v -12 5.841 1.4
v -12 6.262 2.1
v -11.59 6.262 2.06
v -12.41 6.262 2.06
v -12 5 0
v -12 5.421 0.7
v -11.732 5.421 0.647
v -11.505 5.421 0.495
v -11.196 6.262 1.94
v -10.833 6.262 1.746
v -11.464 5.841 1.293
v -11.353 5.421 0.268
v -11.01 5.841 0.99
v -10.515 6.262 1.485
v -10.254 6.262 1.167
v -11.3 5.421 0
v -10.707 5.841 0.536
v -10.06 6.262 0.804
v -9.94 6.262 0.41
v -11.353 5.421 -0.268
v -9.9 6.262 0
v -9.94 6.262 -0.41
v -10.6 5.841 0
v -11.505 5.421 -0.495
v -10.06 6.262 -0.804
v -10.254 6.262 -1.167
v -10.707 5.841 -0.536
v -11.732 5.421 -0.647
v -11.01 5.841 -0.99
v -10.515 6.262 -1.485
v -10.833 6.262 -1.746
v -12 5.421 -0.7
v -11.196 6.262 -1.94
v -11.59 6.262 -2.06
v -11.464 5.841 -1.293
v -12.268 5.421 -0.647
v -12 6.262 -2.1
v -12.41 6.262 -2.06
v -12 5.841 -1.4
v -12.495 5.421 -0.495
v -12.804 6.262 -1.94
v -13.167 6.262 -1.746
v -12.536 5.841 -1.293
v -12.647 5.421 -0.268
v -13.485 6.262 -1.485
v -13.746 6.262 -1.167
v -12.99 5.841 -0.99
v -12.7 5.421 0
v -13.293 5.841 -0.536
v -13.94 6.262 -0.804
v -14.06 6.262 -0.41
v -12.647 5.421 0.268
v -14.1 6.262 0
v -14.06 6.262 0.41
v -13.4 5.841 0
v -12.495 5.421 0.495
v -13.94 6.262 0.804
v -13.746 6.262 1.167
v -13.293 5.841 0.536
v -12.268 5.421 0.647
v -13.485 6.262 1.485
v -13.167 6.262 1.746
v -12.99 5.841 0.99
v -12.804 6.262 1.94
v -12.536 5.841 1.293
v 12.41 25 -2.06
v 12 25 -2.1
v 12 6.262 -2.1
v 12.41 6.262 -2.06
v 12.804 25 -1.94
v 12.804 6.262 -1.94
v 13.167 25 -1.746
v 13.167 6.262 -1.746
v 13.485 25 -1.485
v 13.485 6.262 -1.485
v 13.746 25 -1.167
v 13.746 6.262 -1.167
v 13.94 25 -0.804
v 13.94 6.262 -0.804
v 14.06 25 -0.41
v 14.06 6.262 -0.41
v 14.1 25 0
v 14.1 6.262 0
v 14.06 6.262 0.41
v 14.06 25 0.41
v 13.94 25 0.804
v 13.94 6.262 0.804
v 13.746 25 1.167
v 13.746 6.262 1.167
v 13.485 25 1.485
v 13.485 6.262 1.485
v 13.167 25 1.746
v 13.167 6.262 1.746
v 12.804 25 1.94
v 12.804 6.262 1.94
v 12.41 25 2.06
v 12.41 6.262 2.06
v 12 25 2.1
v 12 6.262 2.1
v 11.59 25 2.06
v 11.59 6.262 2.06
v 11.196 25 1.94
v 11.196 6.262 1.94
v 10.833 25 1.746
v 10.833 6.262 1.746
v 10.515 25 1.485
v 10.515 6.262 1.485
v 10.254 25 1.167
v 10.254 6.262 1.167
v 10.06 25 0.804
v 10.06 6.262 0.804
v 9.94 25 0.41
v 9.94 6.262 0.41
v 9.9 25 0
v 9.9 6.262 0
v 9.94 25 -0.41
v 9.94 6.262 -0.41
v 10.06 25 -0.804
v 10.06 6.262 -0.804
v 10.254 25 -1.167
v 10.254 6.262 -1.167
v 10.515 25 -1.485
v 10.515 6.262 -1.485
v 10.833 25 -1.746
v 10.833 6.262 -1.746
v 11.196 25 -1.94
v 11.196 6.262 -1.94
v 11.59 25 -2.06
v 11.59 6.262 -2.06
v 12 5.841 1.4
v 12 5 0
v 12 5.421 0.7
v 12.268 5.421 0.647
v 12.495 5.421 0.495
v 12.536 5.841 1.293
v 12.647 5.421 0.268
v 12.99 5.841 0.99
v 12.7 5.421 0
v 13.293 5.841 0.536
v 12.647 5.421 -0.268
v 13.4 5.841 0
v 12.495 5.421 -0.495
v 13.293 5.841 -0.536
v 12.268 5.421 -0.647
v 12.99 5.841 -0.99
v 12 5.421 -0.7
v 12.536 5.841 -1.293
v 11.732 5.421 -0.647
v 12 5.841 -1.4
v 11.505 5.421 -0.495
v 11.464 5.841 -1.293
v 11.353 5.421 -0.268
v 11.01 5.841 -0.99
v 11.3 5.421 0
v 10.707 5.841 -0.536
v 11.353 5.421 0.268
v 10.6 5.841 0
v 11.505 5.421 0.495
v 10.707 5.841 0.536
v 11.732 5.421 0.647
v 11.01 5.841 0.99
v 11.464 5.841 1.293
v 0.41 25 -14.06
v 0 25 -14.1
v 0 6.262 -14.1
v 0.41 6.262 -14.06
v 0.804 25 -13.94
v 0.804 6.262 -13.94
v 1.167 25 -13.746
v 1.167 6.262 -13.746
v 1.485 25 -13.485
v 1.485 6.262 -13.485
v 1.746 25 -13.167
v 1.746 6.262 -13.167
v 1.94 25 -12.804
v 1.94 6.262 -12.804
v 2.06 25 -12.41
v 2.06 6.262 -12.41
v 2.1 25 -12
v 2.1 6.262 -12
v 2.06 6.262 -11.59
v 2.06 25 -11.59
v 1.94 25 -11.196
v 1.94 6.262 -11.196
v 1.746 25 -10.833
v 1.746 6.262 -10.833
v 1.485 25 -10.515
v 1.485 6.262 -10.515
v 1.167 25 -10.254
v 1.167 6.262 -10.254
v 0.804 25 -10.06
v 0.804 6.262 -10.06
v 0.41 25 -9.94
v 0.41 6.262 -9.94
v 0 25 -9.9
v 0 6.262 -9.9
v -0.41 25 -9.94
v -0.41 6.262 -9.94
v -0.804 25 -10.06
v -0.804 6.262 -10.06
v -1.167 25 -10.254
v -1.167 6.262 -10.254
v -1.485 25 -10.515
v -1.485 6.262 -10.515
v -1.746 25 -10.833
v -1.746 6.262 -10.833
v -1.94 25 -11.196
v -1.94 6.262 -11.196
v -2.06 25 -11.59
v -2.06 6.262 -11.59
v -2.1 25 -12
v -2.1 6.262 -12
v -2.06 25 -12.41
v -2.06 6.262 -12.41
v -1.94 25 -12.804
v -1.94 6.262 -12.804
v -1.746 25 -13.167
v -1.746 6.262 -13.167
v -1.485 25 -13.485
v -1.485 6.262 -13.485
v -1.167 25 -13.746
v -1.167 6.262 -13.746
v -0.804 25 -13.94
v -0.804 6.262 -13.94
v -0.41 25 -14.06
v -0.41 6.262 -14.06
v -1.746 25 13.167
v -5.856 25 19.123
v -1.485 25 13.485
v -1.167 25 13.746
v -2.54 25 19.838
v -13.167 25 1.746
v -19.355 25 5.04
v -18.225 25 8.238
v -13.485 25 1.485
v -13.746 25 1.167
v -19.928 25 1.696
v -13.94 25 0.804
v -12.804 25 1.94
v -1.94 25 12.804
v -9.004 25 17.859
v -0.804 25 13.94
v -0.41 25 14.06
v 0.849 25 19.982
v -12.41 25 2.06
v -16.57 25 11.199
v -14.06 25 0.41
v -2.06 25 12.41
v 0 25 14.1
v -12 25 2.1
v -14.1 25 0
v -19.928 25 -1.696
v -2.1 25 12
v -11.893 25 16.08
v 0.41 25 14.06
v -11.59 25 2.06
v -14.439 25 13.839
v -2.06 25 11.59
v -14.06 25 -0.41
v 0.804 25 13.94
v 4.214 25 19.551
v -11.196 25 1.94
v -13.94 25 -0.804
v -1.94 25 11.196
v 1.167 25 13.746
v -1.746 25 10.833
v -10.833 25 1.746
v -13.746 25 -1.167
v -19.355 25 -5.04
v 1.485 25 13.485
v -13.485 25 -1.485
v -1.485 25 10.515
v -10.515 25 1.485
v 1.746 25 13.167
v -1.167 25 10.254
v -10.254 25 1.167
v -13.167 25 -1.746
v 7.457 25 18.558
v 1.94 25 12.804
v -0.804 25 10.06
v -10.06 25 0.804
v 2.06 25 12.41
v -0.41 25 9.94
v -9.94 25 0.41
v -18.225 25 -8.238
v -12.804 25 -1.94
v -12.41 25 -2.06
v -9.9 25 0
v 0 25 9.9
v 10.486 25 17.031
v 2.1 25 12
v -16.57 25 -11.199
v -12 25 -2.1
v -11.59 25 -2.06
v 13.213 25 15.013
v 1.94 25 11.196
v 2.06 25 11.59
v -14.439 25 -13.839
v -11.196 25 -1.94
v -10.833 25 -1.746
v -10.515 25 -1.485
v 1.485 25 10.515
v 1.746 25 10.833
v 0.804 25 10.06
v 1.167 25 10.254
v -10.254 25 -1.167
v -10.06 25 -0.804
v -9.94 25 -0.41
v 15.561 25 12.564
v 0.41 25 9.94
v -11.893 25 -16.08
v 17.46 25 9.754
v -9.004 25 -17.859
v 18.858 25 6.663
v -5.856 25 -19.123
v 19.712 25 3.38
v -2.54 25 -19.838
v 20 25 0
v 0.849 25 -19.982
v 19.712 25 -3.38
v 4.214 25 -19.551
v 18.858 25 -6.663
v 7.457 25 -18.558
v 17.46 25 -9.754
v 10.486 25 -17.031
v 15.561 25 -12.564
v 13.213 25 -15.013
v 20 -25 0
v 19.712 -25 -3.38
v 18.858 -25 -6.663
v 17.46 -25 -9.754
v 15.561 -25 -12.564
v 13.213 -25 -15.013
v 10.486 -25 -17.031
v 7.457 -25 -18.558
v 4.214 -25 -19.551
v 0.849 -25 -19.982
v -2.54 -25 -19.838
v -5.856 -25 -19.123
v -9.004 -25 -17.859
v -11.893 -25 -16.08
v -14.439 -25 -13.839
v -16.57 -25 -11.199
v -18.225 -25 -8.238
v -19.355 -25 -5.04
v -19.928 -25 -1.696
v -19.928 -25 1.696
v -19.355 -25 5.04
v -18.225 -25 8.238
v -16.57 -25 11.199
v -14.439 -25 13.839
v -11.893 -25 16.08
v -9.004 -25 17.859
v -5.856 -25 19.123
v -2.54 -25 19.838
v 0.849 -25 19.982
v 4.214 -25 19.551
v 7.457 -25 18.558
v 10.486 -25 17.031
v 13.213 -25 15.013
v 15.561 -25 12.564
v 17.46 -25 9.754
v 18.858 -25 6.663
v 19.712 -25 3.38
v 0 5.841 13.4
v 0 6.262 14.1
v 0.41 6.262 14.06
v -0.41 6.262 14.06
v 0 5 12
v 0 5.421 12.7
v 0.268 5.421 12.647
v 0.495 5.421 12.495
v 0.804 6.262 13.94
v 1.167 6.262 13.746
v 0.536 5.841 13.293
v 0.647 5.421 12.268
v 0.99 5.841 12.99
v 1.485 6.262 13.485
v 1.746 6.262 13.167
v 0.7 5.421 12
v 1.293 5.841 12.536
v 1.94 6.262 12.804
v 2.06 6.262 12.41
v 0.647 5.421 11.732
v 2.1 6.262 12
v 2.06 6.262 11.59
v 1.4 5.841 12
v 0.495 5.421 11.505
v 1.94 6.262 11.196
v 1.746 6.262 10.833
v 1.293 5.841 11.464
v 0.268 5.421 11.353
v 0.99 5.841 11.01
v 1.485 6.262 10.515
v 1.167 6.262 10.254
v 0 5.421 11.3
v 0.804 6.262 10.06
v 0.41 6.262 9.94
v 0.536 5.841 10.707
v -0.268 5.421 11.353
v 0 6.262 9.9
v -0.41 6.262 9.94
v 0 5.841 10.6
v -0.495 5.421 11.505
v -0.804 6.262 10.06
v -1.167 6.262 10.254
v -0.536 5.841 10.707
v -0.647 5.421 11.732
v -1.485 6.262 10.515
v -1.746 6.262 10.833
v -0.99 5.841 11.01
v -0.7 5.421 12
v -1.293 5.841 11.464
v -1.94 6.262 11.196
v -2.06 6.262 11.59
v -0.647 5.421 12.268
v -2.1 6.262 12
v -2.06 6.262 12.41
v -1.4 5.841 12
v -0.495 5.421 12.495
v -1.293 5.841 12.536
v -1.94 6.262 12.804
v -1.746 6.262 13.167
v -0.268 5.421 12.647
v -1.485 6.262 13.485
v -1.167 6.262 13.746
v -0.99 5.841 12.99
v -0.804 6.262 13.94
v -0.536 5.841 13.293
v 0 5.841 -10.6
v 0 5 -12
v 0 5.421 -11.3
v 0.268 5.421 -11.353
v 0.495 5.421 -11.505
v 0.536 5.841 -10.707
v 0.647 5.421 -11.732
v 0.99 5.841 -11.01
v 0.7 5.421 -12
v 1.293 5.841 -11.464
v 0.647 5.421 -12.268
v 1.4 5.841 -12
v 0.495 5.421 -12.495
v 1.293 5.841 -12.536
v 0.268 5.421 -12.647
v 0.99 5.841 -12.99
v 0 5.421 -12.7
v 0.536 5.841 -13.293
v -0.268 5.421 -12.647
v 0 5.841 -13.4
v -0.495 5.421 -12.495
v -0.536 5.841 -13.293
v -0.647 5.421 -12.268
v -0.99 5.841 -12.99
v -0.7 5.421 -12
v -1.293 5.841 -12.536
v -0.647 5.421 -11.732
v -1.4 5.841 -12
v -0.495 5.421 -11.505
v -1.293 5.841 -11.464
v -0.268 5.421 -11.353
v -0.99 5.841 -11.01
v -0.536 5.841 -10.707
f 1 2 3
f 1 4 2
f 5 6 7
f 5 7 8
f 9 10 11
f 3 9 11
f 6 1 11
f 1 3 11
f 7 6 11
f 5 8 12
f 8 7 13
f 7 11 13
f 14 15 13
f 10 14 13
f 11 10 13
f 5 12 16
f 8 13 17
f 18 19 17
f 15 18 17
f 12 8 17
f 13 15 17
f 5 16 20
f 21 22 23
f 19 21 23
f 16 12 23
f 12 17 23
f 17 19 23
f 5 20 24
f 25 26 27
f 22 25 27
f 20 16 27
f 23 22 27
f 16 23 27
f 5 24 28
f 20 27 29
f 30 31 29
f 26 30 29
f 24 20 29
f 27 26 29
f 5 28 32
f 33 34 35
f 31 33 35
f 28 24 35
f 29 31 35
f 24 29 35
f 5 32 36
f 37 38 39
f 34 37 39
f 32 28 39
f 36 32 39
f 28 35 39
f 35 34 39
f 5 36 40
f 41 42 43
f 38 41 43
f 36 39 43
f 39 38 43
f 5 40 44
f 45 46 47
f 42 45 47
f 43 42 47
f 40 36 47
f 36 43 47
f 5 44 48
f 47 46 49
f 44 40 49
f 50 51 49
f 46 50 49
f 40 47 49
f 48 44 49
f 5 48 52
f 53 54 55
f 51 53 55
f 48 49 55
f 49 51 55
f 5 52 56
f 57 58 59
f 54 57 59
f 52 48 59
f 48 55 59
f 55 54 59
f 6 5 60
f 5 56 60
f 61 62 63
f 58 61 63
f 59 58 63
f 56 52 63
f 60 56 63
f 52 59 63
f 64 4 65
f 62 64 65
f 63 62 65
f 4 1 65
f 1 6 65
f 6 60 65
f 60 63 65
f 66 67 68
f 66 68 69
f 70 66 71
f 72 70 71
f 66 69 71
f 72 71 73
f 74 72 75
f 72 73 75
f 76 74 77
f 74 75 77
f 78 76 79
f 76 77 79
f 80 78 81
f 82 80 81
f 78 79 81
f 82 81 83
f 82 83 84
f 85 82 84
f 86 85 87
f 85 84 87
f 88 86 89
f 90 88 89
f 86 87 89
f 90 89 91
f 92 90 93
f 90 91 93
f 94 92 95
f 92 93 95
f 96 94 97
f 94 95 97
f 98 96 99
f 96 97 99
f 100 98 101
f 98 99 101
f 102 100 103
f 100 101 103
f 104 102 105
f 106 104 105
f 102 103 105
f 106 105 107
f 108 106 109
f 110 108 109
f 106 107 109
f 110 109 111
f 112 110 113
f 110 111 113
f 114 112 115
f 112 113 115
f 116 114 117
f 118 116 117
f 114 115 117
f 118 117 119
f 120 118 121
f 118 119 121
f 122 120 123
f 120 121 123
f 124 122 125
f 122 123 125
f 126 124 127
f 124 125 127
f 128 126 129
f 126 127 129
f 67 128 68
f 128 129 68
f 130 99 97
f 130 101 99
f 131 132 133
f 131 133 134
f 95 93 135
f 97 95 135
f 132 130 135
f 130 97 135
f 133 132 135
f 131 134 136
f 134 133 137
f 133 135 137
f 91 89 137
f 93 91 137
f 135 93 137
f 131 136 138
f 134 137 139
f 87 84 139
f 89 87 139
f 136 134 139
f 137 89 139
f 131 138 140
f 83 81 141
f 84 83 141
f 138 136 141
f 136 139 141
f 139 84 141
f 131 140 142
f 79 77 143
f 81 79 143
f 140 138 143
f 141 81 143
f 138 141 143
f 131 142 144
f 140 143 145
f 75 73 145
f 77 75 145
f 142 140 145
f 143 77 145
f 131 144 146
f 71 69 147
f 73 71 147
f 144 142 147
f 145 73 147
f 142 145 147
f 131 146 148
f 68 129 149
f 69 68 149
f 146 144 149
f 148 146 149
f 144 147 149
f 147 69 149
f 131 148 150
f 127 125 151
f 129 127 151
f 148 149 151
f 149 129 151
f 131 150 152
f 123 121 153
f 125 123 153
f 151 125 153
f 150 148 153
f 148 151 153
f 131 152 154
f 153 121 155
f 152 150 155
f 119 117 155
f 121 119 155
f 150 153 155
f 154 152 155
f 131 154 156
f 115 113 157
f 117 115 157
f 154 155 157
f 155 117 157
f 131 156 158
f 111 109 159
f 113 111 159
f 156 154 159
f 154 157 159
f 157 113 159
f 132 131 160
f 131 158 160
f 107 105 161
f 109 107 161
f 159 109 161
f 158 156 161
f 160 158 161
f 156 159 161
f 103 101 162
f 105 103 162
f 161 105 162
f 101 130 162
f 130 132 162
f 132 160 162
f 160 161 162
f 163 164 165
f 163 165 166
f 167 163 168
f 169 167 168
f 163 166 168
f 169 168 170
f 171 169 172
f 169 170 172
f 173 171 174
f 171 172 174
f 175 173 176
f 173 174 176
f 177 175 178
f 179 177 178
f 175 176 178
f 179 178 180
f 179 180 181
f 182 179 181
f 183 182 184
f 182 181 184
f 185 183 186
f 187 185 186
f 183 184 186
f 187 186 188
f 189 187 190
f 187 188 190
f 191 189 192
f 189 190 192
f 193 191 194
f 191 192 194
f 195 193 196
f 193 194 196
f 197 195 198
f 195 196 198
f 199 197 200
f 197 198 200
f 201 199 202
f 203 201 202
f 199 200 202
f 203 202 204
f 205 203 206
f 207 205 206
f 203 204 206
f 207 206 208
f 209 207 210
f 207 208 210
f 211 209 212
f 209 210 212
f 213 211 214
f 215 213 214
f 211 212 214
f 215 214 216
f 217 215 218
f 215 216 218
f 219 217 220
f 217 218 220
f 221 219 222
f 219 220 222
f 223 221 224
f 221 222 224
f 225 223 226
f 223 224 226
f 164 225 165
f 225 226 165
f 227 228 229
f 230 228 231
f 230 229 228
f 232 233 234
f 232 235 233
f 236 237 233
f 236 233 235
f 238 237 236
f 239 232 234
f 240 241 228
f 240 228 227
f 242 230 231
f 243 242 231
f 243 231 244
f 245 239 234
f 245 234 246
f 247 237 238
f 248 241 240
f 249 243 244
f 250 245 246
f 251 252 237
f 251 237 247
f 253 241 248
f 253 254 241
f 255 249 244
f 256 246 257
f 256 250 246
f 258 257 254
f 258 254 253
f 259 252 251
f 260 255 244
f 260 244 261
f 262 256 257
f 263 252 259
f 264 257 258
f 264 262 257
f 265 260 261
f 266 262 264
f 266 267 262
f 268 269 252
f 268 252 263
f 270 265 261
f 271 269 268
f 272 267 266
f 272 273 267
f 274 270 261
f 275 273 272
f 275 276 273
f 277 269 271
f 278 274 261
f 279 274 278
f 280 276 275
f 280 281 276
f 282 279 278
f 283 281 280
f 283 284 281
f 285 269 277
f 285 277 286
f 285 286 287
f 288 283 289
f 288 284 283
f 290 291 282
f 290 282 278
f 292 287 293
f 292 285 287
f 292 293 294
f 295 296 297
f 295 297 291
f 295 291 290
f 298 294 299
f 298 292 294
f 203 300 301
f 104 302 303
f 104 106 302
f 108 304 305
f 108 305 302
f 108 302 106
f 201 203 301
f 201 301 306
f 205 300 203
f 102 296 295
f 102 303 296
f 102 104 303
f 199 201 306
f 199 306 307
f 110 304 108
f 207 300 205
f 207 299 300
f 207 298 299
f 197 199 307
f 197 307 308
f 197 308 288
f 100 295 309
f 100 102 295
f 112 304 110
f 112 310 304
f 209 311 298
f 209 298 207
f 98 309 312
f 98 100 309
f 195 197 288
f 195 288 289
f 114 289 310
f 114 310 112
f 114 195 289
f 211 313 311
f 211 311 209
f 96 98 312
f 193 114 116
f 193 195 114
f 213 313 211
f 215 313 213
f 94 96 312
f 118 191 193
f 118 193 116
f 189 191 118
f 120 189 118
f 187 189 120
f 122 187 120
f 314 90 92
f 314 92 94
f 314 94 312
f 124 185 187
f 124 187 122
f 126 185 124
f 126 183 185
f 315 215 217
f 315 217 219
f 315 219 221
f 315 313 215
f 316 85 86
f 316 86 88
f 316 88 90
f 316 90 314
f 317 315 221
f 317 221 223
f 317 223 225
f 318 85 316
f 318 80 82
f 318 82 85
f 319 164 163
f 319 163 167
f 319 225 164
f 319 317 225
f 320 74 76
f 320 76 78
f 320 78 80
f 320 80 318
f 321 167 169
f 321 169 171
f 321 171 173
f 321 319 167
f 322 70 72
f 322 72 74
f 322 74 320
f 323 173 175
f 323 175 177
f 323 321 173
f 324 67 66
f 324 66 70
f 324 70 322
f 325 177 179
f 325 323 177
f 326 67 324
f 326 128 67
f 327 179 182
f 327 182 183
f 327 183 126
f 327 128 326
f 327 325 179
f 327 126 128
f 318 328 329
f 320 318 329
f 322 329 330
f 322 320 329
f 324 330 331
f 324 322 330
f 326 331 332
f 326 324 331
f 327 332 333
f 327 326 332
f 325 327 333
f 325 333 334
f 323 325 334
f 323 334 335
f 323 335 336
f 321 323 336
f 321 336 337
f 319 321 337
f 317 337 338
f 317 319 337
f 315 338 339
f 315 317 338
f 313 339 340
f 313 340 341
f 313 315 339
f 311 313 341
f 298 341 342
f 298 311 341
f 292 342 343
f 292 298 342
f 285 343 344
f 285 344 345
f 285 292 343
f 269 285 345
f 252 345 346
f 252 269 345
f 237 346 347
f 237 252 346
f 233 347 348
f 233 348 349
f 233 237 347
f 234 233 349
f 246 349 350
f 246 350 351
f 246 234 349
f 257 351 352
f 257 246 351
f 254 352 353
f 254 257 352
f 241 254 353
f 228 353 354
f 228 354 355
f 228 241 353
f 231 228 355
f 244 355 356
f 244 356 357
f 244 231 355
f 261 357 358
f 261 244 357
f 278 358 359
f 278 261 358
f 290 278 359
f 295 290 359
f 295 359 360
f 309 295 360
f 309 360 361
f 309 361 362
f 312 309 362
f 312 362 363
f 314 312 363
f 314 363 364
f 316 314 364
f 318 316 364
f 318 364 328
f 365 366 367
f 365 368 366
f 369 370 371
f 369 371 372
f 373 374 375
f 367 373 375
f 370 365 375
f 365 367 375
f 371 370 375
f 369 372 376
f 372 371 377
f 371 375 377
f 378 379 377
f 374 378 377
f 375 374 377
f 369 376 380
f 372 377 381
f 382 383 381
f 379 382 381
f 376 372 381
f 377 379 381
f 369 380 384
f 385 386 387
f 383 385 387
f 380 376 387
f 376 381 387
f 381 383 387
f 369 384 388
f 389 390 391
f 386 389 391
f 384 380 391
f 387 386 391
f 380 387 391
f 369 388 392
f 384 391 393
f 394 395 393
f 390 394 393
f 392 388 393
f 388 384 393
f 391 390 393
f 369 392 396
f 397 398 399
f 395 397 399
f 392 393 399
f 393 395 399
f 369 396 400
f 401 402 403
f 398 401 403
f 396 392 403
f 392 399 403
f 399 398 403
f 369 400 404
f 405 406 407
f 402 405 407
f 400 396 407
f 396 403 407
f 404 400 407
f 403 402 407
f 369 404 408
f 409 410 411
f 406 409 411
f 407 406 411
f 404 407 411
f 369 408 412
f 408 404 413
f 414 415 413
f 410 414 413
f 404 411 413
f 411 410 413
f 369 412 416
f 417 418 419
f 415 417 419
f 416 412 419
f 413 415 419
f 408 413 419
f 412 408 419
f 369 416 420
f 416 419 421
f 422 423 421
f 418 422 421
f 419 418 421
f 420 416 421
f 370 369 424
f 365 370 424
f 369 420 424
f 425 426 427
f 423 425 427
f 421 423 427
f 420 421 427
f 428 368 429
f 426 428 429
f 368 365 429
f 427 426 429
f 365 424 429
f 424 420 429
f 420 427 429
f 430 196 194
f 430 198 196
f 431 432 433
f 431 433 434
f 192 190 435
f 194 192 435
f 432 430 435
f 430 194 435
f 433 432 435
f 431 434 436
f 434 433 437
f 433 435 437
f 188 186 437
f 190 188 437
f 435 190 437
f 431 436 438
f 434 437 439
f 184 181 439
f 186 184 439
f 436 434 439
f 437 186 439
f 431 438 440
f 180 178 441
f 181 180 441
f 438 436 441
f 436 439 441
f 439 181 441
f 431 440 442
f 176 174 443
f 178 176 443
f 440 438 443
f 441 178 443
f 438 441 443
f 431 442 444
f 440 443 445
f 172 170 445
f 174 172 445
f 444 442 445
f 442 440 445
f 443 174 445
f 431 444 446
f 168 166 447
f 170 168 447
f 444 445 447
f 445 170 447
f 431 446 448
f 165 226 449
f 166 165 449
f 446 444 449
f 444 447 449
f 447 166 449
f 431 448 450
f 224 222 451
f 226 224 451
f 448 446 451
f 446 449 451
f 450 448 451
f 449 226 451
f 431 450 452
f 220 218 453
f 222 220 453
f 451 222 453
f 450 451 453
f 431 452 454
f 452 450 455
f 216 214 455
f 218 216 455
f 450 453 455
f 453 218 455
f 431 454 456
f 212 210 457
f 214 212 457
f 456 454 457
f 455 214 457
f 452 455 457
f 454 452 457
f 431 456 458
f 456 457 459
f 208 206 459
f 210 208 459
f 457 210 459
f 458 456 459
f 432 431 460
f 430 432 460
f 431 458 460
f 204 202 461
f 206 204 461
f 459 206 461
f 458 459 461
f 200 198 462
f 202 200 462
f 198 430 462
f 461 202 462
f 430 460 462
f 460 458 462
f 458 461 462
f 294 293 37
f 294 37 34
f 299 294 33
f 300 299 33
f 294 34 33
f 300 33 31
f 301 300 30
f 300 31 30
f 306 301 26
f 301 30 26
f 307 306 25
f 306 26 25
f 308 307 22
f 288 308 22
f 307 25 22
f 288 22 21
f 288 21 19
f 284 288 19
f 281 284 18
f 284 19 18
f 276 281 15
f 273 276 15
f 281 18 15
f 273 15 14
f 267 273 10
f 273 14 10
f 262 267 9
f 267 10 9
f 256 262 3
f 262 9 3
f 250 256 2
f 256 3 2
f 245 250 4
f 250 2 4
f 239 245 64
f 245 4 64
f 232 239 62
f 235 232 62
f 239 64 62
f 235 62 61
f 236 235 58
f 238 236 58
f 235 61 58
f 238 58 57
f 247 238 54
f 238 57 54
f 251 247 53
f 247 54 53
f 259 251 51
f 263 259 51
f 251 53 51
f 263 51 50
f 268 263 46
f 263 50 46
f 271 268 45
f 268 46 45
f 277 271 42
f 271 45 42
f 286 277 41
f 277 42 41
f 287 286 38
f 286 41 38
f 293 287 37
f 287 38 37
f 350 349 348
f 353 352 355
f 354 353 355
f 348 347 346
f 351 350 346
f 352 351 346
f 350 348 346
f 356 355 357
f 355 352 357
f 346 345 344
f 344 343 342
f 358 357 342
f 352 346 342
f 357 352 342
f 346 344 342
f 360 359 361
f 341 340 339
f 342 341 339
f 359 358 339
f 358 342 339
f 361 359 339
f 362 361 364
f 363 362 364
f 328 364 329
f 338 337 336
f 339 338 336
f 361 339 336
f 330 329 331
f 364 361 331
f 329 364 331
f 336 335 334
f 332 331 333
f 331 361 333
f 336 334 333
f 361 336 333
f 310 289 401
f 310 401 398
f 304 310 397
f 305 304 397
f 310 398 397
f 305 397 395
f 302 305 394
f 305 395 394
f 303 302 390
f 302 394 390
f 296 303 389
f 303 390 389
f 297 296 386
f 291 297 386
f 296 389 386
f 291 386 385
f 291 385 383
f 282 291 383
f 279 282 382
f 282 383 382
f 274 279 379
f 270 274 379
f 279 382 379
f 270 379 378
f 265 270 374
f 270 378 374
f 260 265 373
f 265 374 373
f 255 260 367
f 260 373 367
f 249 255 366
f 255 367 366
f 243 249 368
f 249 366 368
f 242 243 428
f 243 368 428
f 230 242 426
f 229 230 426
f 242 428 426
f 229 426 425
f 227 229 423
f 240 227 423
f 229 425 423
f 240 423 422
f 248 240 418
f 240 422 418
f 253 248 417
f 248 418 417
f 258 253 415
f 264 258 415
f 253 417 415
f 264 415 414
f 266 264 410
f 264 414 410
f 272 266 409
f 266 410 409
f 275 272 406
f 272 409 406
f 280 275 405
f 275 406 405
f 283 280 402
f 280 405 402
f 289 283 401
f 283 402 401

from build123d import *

# Parameters (mm, degrees)
SKETCH1_R                 = 20
BOSS_EXTRUDE1_DEPTH       = 25
M5X0_8_TAPPED_HOLE1_D     = 4.2
M5X0_8_TAPPED_HOLE1_DEPTH = 18.7381927
M5X0_8_TAPPED_HOLE1_TIP   = 1.2618073


with BuildPart() as part:
    # Sketch1 → Boss-Extrude1 (new body, symmetric)
    with BuildSketch(Plane(origin=(0, 0, 0), x_dir=(1, 0, 0), z_dir=(0, 1, 0))):
        Circle(SKETCH1_R)
    extrude(amount=BOSS_EXTRUDE1_DEPTH, both=True)

    # M5x0.8 Tapped Hole1
    with Locations(Plane(origin=(0, 25, -12), x_dir=(0, 0, 1), z_dir=(0, 1, 0))):
        with Locations((0, 0), (12, 12), (24, 0), (12, -12)):
            Hole(M5X0_8_TAPPED_HOLE1_D / 2, depth=M5X0_8_TAPPED_HOLE1_DEPTH)
            with Locations((0, 0, -(M5X0_8_TAPPED_HOLE1_DEPTH + M5X0_8_TAPPED_HOLE1_TIP / 2))):  # 118° drill point
                Cone(0, M5X0_8_TAPPED_HOLE1_D / 2, M5X0_8_TAPPED_HOLE1_TIP, mode=Mode.SUBTRACT)


solid = part.part
